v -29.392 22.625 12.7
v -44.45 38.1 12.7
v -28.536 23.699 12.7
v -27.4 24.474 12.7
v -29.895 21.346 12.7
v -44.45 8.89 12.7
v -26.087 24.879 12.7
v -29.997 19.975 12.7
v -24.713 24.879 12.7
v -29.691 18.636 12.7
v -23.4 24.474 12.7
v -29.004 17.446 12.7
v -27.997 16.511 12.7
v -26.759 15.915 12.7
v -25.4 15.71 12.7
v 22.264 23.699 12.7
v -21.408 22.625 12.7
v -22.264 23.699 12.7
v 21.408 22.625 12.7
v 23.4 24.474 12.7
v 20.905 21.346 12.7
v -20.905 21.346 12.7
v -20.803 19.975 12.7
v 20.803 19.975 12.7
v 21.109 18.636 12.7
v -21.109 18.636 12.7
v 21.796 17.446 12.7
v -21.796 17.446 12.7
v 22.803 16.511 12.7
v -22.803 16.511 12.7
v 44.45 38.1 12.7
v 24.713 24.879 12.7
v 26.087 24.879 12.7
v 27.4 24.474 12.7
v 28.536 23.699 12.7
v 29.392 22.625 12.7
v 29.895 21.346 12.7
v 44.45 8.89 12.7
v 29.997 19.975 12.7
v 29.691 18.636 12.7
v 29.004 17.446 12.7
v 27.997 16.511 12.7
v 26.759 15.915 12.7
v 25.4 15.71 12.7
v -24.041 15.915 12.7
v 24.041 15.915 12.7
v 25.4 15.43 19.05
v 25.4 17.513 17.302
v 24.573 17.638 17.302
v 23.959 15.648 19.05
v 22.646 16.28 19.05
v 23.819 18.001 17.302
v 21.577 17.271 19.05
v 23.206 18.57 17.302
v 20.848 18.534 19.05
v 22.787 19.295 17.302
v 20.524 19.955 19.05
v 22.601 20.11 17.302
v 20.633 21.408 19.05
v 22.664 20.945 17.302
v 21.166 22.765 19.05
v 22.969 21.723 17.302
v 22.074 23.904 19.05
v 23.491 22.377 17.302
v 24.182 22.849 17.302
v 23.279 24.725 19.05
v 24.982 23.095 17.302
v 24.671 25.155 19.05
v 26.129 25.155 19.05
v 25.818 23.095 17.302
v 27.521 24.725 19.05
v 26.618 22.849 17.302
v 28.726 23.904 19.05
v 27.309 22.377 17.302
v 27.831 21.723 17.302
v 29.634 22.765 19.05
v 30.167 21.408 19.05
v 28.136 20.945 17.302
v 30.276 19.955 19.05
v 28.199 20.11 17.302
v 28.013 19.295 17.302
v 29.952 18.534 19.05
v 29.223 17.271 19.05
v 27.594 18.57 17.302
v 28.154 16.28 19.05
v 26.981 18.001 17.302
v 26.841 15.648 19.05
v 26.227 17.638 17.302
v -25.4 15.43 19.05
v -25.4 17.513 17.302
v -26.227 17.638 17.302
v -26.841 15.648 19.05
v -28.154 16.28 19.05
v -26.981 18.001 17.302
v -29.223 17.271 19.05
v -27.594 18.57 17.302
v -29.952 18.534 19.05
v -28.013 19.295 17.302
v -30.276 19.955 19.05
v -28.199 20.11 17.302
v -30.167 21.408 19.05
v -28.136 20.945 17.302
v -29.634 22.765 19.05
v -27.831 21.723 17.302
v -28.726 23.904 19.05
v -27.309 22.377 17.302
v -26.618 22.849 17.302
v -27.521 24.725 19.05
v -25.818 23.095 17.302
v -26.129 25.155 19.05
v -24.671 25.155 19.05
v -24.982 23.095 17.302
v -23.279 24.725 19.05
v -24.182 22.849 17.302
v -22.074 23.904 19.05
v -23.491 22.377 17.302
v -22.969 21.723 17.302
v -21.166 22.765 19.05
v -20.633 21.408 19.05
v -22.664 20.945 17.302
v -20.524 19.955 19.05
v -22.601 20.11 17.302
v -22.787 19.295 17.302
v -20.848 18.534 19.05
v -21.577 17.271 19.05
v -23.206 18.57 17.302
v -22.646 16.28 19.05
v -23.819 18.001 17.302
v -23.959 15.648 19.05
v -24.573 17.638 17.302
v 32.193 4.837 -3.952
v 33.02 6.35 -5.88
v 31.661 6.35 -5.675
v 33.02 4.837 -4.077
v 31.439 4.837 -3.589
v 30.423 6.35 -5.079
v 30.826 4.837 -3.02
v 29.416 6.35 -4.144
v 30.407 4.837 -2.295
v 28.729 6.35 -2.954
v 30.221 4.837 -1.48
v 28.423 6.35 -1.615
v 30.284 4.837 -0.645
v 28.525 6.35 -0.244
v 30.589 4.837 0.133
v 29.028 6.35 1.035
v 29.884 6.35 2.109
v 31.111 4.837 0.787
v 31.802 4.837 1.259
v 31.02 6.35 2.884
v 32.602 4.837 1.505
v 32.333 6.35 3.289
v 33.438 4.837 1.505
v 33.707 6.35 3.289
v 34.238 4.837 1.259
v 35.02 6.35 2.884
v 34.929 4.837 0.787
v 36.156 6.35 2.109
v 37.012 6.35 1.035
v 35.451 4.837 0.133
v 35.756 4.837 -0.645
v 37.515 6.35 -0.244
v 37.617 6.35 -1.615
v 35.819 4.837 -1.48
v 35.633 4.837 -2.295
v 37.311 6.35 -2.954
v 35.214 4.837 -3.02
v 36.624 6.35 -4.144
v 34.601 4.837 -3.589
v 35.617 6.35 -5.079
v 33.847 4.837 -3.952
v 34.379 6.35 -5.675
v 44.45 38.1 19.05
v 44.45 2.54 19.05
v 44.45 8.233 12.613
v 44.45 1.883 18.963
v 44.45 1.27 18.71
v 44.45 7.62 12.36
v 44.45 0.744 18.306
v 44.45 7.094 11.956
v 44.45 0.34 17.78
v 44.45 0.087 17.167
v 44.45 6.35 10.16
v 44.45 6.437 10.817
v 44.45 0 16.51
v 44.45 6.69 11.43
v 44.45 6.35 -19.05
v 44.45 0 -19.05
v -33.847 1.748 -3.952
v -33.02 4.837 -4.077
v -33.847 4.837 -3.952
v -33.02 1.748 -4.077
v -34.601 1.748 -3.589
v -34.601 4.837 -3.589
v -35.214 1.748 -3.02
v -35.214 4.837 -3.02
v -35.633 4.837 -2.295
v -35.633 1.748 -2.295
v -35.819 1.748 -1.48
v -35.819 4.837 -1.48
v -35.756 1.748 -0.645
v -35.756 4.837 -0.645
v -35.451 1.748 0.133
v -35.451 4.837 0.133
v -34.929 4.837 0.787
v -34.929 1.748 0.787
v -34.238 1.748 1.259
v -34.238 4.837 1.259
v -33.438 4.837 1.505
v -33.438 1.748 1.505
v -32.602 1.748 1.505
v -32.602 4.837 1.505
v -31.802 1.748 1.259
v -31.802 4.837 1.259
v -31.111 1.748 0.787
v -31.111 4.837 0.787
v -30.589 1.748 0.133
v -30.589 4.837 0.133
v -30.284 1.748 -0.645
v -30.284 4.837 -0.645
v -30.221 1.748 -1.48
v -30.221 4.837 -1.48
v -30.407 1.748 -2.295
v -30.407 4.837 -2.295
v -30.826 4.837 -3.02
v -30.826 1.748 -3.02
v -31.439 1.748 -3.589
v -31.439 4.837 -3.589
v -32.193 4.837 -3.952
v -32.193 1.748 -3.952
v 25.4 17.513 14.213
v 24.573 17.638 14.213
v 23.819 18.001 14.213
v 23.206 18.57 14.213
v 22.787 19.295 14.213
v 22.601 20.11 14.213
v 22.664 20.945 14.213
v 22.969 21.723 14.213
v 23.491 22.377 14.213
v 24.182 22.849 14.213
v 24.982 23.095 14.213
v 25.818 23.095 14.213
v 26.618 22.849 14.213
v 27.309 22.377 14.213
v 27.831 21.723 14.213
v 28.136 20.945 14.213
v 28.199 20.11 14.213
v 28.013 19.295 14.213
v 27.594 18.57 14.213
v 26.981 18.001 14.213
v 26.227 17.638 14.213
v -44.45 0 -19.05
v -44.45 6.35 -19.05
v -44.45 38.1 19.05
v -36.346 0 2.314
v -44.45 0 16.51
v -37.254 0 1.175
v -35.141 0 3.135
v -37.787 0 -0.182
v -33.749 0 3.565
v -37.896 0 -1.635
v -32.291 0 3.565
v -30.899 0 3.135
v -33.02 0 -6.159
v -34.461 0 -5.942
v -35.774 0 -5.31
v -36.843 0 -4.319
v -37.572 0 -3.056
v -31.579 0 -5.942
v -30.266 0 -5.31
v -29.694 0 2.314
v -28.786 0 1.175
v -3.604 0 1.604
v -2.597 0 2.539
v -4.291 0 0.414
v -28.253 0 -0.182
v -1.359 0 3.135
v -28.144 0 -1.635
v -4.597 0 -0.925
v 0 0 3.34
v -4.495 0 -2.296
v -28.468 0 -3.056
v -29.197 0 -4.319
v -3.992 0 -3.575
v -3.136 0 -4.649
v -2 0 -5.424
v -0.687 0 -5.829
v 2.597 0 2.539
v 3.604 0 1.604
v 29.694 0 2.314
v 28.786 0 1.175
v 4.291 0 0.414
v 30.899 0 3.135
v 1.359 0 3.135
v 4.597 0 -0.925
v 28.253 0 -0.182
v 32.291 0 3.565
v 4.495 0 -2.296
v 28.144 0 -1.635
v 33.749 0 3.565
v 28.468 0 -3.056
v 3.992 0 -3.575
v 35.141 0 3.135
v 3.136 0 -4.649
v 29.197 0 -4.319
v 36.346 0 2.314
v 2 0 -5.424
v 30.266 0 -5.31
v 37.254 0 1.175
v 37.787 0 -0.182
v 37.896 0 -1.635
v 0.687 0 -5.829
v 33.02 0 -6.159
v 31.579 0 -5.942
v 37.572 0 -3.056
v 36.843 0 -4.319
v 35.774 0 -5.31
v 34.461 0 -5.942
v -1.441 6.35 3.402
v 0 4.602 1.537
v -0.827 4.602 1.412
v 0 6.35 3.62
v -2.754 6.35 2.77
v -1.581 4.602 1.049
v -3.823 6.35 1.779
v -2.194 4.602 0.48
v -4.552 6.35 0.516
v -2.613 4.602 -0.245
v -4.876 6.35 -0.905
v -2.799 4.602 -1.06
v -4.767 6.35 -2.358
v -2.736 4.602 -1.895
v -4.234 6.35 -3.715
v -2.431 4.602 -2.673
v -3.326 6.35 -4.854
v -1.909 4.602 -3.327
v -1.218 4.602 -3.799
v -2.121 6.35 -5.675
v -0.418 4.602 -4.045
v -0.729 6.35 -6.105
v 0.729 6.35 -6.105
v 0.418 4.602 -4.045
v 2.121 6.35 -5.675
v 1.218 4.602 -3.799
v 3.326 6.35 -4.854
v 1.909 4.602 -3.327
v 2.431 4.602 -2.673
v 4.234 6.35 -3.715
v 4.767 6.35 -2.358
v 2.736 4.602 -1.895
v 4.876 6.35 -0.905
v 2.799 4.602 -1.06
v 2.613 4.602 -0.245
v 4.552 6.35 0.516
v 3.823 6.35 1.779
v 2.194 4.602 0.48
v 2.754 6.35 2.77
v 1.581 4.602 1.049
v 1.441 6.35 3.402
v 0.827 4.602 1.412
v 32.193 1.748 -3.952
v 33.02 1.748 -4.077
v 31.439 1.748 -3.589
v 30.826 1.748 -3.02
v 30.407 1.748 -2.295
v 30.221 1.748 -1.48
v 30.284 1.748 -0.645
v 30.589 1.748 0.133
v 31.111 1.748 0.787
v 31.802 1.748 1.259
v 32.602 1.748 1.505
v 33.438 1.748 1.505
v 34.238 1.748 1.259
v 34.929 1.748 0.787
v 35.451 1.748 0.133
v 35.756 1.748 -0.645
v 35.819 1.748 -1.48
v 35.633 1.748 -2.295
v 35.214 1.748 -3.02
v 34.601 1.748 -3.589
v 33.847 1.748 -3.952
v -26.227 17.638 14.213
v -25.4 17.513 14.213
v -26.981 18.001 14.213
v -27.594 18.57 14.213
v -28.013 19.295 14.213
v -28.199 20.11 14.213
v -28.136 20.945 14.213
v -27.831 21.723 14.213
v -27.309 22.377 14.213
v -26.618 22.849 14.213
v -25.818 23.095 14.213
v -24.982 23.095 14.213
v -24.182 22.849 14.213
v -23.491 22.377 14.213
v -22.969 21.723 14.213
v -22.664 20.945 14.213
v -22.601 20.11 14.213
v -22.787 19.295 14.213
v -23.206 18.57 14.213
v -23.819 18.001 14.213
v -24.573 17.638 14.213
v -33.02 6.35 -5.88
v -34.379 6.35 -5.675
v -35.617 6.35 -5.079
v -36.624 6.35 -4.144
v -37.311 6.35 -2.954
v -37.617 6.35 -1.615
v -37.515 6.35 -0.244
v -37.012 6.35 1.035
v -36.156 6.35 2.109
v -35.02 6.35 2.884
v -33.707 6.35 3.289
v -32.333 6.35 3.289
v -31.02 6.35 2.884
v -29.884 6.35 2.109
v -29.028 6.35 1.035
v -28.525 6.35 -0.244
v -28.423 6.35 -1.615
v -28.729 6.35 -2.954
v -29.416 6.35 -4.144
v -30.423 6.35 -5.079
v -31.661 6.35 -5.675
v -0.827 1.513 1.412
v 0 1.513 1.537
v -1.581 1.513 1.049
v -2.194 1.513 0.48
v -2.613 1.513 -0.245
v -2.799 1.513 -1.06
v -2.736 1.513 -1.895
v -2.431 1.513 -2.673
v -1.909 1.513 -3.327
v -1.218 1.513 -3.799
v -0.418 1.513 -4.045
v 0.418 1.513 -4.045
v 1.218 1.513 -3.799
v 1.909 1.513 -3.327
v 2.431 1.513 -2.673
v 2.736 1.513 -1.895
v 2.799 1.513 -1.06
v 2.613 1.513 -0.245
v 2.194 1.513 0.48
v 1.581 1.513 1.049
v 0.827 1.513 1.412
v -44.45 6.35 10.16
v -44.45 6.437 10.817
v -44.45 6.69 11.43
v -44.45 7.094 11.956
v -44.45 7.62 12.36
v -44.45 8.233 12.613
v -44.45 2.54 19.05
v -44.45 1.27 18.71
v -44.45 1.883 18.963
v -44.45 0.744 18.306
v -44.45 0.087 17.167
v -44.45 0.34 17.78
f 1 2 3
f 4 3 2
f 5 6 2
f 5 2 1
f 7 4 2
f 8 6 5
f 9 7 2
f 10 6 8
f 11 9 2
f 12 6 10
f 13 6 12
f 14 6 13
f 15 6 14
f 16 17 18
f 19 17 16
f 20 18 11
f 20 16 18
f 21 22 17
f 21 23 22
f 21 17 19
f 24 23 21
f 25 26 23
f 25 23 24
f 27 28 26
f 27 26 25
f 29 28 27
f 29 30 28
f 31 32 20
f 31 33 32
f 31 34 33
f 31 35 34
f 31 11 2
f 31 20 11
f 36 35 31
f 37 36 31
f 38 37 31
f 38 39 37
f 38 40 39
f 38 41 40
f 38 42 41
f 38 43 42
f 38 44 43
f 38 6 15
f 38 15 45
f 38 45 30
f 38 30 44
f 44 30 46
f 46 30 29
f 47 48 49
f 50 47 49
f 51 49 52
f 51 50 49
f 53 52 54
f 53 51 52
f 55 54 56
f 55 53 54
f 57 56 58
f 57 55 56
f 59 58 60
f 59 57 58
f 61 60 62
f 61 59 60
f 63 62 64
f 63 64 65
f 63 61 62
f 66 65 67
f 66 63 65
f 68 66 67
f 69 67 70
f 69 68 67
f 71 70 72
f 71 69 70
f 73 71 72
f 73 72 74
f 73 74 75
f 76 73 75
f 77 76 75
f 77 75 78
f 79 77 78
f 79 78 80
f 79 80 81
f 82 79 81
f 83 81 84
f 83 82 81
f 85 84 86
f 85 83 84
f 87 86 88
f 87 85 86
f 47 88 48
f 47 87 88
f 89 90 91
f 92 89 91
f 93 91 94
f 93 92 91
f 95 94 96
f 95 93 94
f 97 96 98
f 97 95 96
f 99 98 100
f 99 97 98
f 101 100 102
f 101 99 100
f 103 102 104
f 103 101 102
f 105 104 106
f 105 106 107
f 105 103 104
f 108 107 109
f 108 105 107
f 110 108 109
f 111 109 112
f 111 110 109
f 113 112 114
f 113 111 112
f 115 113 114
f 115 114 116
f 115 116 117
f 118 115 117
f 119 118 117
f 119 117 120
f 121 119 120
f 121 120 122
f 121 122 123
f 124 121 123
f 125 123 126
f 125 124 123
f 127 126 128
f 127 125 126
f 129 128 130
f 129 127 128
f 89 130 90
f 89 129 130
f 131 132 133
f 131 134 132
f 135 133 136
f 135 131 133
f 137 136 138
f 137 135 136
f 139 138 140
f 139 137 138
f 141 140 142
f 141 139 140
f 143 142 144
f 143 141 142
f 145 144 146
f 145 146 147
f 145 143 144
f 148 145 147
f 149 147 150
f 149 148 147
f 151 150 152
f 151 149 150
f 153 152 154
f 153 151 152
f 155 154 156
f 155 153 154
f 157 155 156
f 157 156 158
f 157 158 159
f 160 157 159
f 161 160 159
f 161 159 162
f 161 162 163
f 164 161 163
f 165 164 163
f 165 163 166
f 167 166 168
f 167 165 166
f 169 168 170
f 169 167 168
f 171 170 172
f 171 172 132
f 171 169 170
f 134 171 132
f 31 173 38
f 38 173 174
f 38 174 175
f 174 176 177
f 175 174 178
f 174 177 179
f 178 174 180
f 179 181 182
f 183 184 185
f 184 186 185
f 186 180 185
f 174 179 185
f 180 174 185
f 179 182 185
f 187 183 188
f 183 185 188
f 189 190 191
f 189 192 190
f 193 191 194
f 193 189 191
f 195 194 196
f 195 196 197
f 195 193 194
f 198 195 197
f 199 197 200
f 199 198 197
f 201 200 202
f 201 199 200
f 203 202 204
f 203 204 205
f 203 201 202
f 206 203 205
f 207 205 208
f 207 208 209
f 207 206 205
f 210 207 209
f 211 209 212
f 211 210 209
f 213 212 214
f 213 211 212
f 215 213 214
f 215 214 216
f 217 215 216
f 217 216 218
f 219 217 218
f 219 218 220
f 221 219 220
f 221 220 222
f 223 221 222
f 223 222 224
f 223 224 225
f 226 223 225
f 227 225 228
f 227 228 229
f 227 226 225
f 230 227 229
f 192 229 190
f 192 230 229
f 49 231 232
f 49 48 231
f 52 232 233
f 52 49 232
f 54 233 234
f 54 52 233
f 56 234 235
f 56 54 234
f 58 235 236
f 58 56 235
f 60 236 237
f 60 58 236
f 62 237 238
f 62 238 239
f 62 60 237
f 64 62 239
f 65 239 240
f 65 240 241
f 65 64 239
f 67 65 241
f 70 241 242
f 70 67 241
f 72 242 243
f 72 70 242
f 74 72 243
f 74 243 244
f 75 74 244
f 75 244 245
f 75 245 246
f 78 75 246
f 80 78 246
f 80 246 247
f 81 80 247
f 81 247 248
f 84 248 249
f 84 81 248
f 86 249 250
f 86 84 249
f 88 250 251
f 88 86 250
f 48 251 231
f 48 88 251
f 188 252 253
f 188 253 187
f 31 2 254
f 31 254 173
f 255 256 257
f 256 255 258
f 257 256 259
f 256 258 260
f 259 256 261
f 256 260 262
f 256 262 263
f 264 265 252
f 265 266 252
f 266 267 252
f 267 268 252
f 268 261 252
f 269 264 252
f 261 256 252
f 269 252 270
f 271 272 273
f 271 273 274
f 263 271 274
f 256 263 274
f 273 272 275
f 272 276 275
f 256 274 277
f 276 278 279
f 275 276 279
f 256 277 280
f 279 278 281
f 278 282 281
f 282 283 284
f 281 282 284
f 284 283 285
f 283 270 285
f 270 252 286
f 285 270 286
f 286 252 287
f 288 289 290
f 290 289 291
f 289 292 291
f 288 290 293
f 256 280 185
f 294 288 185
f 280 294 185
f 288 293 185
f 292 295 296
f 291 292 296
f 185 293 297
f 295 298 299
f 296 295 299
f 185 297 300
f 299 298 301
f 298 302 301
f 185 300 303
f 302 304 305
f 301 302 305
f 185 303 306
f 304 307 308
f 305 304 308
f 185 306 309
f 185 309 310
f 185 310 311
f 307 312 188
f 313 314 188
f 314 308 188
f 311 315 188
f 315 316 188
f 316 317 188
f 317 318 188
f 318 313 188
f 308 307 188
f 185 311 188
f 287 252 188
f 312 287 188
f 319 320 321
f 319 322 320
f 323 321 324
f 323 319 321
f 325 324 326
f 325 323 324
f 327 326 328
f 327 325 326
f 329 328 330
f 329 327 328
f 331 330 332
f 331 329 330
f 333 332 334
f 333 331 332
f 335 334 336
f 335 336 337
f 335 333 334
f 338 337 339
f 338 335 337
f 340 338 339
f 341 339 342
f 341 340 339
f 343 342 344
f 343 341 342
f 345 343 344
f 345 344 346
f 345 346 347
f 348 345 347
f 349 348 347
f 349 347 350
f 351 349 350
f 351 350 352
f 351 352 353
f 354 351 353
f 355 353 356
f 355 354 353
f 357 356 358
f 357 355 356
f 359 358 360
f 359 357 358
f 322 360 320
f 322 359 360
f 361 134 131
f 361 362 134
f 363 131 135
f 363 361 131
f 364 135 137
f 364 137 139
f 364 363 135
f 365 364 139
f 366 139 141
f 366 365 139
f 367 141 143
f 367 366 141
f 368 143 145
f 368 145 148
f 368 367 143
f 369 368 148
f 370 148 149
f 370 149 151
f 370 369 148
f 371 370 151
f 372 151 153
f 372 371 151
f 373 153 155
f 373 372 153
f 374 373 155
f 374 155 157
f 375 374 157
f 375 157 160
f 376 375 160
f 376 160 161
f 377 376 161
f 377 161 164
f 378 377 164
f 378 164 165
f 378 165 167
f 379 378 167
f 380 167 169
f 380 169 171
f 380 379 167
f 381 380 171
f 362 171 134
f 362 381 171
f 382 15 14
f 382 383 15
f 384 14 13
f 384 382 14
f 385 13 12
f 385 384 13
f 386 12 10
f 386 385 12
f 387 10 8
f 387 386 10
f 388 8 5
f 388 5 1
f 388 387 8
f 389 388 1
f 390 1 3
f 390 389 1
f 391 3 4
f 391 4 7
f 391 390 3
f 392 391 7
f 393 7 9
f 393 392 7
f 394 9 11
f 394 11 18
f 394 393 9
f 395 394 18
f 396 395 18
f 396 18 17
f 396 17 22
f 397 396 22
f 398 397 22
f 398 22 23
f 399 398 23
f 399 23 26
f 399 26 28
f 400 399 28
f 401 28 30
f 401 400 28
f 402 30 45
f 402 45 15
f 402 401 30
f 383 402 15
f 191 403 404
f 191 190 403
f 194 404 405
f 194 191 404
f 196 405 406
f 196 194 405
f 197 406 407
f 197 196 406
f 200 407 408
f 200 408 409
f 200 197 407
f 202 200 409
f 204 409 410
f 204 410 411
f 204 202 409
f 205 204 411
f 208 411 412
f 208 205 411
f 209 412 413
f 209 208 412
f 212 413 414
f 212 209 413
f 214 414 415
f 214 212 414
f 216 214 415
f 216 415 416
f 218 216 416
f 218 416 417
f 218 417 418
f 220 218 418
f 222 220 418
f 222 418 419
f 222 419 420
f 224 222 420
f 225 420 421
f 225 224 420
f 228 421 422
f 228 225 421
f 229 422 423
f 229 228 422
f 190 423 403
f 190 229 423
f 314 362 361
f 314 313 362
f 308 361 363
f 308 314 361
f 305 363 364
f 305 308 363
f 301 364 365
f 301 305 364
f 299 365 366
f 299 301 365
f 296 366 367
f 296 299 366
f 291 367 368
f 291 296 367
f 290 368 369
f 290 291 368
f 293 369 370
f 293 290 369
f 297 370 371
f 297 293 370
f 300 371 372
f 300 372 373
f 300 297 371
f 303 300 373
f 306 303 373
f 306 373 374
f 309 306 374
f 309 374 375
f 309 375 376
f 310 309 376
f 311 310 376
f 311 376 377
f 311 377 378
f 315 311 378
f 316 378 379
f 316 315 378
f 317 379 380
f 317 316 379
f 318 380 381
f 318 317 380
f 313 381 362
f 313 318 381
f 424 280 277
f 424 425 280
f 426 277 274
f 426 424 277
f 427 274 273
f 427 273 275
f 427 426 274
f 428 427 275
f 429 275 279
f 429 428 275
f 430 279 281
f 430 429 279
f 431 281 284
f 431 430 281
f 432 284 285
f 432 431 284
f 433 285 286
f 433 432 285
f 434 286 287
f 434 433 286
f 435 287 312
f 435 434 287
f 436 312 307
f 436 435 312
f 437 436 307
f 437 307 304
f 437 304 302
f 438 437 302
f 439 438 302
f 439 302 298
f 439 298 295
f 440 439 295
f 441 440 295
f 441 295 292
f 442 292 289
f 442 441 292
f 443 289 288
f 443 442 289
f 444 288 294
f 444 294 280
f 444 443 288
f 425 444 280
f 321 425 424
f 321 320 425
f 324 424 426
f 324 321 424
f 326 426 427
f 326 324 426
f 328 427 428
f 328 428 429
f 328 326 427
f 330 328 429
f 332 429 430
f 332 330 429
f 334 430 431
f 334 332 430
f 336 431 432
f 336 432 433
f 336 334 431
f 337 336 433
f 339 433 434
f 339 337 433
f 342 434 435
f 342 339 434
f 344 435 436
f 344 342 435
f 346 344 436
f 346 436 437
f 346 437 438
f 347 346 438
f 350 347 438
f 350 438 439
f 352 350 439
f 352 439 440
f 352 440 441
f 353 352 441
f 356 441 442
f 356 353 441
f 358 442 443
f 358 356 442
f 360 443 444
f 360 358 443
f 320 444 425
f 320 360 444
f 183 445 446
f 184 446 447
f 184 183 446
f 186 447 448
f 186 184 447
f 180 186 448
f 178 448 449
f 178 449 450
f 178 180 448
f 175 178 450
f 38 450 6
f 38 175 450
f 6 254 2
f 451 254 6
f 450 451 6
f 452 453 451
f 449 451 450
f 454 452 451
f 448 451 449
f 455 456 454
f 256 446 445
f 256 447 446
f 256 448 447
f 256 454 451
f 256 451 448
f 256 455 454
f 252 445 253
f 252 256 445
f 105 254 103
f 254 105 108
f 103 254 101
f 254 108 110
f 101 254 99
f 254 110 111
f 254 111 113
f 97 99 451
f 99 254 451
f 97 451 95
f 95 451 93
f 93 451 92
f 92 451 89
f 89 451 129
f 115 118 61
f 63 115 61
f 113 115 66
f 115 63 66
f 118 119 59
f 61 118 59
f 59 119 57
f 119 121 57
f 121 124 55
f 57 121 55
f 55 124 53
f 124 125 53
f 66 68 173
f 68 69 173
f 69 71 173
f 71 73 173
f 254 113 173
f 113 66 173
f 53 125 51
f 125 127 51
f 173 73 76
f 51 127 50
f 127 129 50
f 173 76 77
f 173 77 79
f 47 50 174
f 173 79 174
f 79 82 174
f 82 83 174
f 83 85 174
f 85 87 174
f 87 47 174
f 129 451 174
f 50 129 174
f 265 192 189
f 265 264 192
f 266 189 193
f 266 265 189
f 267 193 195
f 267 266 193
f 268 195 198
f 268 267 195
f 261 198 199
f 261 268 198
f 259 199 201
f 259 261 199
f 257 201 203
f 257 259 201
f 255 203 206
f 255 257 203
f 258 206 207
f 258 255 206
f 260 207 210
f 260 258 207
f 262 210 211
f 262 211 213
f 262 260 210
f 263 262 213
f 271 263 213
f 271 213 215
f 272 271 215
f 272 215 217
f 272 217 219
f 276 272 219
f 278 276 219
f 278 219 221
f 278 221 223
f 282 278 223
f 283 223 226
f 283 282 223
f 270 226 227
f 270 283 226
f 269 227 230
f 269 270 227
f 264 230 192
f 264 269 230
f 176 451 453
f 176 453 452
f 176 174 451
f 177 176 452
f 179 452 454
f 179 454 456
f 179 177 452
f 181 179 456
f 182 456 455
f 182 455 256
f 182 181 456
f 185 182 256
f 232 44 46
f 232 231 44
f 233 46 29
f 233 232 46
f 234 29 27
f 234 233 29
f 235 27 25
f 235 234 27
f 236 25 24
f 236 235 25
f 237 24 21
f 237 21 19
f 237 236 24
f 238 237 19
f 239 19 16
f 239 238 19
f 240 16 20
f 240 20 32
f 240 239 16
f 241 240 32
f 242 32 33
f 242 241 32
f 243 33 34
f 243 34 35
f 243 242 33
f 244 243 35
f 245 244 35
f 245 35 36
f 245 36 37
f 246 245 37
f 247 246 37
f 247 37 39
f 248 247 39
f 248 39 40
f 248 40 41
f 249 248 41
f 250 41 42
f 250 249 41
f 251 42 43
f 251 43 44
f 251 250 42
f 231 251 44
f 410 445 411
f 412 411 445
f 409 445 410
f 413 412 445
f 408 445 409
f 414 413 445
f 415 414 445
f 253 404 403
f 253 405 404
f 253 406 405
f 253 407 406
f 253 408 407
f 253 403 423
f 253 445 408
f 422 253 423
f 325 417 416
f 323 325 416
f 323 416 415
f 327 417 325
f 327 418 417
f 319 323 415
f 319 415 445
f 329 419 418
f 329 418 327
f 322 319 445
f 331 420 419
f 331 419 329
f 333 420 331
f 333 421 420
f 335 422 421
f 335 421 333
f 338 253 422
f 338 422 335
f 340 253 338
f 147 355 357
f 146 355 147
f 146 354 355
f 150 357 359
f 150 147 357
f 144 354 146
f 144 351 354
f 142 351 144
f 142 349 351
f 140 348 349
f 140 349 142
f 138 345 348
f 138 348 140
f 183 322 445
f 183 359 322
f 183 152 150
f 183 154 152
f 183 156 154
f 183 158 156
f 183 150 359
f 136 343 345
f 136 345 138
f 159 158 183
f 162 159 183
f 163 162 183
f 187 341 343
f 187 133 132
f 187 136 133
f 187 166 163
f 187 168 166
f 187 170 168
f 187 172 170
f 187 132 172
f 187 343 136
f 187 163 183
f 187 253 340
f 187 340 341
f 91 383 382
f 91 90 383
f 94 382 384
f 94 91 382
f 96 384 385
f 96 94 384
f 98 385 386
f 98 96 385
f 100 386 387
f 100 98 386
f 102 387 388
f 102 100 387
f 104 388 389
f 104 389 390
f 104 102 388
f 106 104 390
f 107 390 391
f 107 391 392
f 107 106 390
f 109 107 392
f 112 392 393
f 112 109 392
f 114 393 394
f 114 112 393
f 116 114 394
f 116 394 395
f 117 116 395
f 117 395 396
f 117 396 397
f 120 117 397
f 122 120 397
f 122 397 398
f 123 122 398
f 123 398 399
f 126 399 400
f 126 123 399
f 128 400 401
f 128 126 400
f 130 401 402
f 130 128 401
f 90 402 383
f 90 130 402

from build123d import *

# Parameters (mm, degrees)
SKETCH1_W           = 88.9
SKETCH1_H           = 38.1
BOSS_EXTRUDE1_DEPTH = 6.35
SKETCH2_W           = 88.9
SKETCH2_H           = 6.35
BOSS_EXTRUDE2_DEPTH = 31.75
FILLET1_R           = 2.54
FILLET2_R           = 2.54


with BuildPart() as part:
    # Sketch1 → Boss-Extrude1 (new body)
    with BuildSketch(Plane(origin=(0, 0, 0), x_dir=(1, 0, 0), z_dir=(0, 1, 0))):
        Rectangle(SKETCH1_W, SKETCH1_H)
    extrude(amount=BOSS_EXTRUDE1_DEPTH)

    # Sketch2 → Boss-Extrude2 (add)
    with BuildSketch(Plane(origin=(0, 6.35, 0), x_dir=(1, 0, 0), z_dir=(0, 1, 0))):
        with Locations((0, -15.875)):
            Rectangle(SKETCH2_W, SKETCH2_H)
    extrude(amount=BOSS_EXTRUDE2_DEPTH)

    # Fillet1
    fillet1_edges = [part.edges().sort_by_distance(p)[0] for p in [
        (0, 6.35, 12.7),
    ]]
    fillet(fillet1_edges, radius=FILLET1_R)

    # Fillet2
    fillet2_edges = [part.edges().sort_by_distance(p)[0] for p in [
        (0, 0, 19.05),
    ]]
    fillet(fillet2_edges, radius=FILLET2_R)

    # Sketch3 → CSK for #10 Flat Head Machine Screw (100)1 (revolve, cut)
    with BuildSketch(Plane(origin=(-25.4, 20.32, 19.05), x_dir=(0, -1, 0), z_dir=(1, 0, 0))):
        Polygon((0, 0), (0, 6.35), (4.6101, 6.35), (2.8067, 4.836767725), (2.8067, 1.747676712), (4.8895, 0), align=None)
    revolve(axis=Axis((-25.4, 20.32, 25.4), (0, 0, -1)), mode=Mode.SUBTRACT)

    # Sketch3 at point 2 (carried to point 2, square into its face) → CSK for _10 Flat Head Machine Screw  2 (revolve, cut)
    with BuildSketch(Plane(origin=(25.4, 20.32, 19.05), x_dir=(0, -1, 0), z_dir=(1, 0, 0))):
        Polygon((0, 0), (0, 6.35), (4.6101, 6.35), (2.8067, 4.836767725), (2.8067, 1.747676712), (4.8895, 0), align=None)
    revolve(axis=Axis((25.4, 20.32, 25.4), (0, 0, -1)), mode=Mode.SUBTRACT)

    # Sketch3 at point 3 (carried to point 3, square into its face) → CSK for _10 Flat Head Machine Screw  3 (revolve, cut)
    with BuildSketch(Plane(origin=(33.02, 0, -1.27), x_dir=(0, 0, -1), z_dir=(1, 0, 0))):
        Polygon((0, 0), (0, 6.35), (4.6101, 6.35), (2.8067, 4.836767725), (2.8067, 1.747676712), (4.8895, 0), align=None)
    revolve(axis=Axis((33.02, -6.35, -1.27), (0, 1, 0)), mode=Mode.SUBTRACT)

    # Sketch3 at point 4 (carried to point 4, square into its face) → CSK for _10 Flat Head Machine Screw  4 (revolve, cut)
    with BuildSketch(Plane(origin=(-33.02, 0, -1.27), x_dir=(0, 0, -1), z_dir=(1, 0, 0))):
        Polygon((0, 0), (0, 6.35), (4.6101, 6.35), (2.8067, 4.836767725), (2.8067, 1.747676712), (4.8895, 0), align=None)
    revolve(axis=Axis((-33.02, -6.35, -1.27), (0, 1, 0)), mode=Mode.SUBTRACT)

    # Sketch3 at point 5 (carried to point 5, square into its face) → CSK for _10 Flat Head Machine Screw  5 (revolve, cut)
    with BuildSketch(Plane(origin=(0, 6.35, -1.27), x_dir=(0, 0, 1), z_dir=(1, 0, 0))):
        Polygon((0, 0), (0, 6.35), (4.6101, 6.35), (2.8067, 4.836767725), (2.8067, 1.747676712), (4.8895, 0), align=None)
    revolve(axis=Axis((0, 12.7, -1.27), (0, -1, 0)), mode=Mode.SUBTRACT)


solid = part.part
